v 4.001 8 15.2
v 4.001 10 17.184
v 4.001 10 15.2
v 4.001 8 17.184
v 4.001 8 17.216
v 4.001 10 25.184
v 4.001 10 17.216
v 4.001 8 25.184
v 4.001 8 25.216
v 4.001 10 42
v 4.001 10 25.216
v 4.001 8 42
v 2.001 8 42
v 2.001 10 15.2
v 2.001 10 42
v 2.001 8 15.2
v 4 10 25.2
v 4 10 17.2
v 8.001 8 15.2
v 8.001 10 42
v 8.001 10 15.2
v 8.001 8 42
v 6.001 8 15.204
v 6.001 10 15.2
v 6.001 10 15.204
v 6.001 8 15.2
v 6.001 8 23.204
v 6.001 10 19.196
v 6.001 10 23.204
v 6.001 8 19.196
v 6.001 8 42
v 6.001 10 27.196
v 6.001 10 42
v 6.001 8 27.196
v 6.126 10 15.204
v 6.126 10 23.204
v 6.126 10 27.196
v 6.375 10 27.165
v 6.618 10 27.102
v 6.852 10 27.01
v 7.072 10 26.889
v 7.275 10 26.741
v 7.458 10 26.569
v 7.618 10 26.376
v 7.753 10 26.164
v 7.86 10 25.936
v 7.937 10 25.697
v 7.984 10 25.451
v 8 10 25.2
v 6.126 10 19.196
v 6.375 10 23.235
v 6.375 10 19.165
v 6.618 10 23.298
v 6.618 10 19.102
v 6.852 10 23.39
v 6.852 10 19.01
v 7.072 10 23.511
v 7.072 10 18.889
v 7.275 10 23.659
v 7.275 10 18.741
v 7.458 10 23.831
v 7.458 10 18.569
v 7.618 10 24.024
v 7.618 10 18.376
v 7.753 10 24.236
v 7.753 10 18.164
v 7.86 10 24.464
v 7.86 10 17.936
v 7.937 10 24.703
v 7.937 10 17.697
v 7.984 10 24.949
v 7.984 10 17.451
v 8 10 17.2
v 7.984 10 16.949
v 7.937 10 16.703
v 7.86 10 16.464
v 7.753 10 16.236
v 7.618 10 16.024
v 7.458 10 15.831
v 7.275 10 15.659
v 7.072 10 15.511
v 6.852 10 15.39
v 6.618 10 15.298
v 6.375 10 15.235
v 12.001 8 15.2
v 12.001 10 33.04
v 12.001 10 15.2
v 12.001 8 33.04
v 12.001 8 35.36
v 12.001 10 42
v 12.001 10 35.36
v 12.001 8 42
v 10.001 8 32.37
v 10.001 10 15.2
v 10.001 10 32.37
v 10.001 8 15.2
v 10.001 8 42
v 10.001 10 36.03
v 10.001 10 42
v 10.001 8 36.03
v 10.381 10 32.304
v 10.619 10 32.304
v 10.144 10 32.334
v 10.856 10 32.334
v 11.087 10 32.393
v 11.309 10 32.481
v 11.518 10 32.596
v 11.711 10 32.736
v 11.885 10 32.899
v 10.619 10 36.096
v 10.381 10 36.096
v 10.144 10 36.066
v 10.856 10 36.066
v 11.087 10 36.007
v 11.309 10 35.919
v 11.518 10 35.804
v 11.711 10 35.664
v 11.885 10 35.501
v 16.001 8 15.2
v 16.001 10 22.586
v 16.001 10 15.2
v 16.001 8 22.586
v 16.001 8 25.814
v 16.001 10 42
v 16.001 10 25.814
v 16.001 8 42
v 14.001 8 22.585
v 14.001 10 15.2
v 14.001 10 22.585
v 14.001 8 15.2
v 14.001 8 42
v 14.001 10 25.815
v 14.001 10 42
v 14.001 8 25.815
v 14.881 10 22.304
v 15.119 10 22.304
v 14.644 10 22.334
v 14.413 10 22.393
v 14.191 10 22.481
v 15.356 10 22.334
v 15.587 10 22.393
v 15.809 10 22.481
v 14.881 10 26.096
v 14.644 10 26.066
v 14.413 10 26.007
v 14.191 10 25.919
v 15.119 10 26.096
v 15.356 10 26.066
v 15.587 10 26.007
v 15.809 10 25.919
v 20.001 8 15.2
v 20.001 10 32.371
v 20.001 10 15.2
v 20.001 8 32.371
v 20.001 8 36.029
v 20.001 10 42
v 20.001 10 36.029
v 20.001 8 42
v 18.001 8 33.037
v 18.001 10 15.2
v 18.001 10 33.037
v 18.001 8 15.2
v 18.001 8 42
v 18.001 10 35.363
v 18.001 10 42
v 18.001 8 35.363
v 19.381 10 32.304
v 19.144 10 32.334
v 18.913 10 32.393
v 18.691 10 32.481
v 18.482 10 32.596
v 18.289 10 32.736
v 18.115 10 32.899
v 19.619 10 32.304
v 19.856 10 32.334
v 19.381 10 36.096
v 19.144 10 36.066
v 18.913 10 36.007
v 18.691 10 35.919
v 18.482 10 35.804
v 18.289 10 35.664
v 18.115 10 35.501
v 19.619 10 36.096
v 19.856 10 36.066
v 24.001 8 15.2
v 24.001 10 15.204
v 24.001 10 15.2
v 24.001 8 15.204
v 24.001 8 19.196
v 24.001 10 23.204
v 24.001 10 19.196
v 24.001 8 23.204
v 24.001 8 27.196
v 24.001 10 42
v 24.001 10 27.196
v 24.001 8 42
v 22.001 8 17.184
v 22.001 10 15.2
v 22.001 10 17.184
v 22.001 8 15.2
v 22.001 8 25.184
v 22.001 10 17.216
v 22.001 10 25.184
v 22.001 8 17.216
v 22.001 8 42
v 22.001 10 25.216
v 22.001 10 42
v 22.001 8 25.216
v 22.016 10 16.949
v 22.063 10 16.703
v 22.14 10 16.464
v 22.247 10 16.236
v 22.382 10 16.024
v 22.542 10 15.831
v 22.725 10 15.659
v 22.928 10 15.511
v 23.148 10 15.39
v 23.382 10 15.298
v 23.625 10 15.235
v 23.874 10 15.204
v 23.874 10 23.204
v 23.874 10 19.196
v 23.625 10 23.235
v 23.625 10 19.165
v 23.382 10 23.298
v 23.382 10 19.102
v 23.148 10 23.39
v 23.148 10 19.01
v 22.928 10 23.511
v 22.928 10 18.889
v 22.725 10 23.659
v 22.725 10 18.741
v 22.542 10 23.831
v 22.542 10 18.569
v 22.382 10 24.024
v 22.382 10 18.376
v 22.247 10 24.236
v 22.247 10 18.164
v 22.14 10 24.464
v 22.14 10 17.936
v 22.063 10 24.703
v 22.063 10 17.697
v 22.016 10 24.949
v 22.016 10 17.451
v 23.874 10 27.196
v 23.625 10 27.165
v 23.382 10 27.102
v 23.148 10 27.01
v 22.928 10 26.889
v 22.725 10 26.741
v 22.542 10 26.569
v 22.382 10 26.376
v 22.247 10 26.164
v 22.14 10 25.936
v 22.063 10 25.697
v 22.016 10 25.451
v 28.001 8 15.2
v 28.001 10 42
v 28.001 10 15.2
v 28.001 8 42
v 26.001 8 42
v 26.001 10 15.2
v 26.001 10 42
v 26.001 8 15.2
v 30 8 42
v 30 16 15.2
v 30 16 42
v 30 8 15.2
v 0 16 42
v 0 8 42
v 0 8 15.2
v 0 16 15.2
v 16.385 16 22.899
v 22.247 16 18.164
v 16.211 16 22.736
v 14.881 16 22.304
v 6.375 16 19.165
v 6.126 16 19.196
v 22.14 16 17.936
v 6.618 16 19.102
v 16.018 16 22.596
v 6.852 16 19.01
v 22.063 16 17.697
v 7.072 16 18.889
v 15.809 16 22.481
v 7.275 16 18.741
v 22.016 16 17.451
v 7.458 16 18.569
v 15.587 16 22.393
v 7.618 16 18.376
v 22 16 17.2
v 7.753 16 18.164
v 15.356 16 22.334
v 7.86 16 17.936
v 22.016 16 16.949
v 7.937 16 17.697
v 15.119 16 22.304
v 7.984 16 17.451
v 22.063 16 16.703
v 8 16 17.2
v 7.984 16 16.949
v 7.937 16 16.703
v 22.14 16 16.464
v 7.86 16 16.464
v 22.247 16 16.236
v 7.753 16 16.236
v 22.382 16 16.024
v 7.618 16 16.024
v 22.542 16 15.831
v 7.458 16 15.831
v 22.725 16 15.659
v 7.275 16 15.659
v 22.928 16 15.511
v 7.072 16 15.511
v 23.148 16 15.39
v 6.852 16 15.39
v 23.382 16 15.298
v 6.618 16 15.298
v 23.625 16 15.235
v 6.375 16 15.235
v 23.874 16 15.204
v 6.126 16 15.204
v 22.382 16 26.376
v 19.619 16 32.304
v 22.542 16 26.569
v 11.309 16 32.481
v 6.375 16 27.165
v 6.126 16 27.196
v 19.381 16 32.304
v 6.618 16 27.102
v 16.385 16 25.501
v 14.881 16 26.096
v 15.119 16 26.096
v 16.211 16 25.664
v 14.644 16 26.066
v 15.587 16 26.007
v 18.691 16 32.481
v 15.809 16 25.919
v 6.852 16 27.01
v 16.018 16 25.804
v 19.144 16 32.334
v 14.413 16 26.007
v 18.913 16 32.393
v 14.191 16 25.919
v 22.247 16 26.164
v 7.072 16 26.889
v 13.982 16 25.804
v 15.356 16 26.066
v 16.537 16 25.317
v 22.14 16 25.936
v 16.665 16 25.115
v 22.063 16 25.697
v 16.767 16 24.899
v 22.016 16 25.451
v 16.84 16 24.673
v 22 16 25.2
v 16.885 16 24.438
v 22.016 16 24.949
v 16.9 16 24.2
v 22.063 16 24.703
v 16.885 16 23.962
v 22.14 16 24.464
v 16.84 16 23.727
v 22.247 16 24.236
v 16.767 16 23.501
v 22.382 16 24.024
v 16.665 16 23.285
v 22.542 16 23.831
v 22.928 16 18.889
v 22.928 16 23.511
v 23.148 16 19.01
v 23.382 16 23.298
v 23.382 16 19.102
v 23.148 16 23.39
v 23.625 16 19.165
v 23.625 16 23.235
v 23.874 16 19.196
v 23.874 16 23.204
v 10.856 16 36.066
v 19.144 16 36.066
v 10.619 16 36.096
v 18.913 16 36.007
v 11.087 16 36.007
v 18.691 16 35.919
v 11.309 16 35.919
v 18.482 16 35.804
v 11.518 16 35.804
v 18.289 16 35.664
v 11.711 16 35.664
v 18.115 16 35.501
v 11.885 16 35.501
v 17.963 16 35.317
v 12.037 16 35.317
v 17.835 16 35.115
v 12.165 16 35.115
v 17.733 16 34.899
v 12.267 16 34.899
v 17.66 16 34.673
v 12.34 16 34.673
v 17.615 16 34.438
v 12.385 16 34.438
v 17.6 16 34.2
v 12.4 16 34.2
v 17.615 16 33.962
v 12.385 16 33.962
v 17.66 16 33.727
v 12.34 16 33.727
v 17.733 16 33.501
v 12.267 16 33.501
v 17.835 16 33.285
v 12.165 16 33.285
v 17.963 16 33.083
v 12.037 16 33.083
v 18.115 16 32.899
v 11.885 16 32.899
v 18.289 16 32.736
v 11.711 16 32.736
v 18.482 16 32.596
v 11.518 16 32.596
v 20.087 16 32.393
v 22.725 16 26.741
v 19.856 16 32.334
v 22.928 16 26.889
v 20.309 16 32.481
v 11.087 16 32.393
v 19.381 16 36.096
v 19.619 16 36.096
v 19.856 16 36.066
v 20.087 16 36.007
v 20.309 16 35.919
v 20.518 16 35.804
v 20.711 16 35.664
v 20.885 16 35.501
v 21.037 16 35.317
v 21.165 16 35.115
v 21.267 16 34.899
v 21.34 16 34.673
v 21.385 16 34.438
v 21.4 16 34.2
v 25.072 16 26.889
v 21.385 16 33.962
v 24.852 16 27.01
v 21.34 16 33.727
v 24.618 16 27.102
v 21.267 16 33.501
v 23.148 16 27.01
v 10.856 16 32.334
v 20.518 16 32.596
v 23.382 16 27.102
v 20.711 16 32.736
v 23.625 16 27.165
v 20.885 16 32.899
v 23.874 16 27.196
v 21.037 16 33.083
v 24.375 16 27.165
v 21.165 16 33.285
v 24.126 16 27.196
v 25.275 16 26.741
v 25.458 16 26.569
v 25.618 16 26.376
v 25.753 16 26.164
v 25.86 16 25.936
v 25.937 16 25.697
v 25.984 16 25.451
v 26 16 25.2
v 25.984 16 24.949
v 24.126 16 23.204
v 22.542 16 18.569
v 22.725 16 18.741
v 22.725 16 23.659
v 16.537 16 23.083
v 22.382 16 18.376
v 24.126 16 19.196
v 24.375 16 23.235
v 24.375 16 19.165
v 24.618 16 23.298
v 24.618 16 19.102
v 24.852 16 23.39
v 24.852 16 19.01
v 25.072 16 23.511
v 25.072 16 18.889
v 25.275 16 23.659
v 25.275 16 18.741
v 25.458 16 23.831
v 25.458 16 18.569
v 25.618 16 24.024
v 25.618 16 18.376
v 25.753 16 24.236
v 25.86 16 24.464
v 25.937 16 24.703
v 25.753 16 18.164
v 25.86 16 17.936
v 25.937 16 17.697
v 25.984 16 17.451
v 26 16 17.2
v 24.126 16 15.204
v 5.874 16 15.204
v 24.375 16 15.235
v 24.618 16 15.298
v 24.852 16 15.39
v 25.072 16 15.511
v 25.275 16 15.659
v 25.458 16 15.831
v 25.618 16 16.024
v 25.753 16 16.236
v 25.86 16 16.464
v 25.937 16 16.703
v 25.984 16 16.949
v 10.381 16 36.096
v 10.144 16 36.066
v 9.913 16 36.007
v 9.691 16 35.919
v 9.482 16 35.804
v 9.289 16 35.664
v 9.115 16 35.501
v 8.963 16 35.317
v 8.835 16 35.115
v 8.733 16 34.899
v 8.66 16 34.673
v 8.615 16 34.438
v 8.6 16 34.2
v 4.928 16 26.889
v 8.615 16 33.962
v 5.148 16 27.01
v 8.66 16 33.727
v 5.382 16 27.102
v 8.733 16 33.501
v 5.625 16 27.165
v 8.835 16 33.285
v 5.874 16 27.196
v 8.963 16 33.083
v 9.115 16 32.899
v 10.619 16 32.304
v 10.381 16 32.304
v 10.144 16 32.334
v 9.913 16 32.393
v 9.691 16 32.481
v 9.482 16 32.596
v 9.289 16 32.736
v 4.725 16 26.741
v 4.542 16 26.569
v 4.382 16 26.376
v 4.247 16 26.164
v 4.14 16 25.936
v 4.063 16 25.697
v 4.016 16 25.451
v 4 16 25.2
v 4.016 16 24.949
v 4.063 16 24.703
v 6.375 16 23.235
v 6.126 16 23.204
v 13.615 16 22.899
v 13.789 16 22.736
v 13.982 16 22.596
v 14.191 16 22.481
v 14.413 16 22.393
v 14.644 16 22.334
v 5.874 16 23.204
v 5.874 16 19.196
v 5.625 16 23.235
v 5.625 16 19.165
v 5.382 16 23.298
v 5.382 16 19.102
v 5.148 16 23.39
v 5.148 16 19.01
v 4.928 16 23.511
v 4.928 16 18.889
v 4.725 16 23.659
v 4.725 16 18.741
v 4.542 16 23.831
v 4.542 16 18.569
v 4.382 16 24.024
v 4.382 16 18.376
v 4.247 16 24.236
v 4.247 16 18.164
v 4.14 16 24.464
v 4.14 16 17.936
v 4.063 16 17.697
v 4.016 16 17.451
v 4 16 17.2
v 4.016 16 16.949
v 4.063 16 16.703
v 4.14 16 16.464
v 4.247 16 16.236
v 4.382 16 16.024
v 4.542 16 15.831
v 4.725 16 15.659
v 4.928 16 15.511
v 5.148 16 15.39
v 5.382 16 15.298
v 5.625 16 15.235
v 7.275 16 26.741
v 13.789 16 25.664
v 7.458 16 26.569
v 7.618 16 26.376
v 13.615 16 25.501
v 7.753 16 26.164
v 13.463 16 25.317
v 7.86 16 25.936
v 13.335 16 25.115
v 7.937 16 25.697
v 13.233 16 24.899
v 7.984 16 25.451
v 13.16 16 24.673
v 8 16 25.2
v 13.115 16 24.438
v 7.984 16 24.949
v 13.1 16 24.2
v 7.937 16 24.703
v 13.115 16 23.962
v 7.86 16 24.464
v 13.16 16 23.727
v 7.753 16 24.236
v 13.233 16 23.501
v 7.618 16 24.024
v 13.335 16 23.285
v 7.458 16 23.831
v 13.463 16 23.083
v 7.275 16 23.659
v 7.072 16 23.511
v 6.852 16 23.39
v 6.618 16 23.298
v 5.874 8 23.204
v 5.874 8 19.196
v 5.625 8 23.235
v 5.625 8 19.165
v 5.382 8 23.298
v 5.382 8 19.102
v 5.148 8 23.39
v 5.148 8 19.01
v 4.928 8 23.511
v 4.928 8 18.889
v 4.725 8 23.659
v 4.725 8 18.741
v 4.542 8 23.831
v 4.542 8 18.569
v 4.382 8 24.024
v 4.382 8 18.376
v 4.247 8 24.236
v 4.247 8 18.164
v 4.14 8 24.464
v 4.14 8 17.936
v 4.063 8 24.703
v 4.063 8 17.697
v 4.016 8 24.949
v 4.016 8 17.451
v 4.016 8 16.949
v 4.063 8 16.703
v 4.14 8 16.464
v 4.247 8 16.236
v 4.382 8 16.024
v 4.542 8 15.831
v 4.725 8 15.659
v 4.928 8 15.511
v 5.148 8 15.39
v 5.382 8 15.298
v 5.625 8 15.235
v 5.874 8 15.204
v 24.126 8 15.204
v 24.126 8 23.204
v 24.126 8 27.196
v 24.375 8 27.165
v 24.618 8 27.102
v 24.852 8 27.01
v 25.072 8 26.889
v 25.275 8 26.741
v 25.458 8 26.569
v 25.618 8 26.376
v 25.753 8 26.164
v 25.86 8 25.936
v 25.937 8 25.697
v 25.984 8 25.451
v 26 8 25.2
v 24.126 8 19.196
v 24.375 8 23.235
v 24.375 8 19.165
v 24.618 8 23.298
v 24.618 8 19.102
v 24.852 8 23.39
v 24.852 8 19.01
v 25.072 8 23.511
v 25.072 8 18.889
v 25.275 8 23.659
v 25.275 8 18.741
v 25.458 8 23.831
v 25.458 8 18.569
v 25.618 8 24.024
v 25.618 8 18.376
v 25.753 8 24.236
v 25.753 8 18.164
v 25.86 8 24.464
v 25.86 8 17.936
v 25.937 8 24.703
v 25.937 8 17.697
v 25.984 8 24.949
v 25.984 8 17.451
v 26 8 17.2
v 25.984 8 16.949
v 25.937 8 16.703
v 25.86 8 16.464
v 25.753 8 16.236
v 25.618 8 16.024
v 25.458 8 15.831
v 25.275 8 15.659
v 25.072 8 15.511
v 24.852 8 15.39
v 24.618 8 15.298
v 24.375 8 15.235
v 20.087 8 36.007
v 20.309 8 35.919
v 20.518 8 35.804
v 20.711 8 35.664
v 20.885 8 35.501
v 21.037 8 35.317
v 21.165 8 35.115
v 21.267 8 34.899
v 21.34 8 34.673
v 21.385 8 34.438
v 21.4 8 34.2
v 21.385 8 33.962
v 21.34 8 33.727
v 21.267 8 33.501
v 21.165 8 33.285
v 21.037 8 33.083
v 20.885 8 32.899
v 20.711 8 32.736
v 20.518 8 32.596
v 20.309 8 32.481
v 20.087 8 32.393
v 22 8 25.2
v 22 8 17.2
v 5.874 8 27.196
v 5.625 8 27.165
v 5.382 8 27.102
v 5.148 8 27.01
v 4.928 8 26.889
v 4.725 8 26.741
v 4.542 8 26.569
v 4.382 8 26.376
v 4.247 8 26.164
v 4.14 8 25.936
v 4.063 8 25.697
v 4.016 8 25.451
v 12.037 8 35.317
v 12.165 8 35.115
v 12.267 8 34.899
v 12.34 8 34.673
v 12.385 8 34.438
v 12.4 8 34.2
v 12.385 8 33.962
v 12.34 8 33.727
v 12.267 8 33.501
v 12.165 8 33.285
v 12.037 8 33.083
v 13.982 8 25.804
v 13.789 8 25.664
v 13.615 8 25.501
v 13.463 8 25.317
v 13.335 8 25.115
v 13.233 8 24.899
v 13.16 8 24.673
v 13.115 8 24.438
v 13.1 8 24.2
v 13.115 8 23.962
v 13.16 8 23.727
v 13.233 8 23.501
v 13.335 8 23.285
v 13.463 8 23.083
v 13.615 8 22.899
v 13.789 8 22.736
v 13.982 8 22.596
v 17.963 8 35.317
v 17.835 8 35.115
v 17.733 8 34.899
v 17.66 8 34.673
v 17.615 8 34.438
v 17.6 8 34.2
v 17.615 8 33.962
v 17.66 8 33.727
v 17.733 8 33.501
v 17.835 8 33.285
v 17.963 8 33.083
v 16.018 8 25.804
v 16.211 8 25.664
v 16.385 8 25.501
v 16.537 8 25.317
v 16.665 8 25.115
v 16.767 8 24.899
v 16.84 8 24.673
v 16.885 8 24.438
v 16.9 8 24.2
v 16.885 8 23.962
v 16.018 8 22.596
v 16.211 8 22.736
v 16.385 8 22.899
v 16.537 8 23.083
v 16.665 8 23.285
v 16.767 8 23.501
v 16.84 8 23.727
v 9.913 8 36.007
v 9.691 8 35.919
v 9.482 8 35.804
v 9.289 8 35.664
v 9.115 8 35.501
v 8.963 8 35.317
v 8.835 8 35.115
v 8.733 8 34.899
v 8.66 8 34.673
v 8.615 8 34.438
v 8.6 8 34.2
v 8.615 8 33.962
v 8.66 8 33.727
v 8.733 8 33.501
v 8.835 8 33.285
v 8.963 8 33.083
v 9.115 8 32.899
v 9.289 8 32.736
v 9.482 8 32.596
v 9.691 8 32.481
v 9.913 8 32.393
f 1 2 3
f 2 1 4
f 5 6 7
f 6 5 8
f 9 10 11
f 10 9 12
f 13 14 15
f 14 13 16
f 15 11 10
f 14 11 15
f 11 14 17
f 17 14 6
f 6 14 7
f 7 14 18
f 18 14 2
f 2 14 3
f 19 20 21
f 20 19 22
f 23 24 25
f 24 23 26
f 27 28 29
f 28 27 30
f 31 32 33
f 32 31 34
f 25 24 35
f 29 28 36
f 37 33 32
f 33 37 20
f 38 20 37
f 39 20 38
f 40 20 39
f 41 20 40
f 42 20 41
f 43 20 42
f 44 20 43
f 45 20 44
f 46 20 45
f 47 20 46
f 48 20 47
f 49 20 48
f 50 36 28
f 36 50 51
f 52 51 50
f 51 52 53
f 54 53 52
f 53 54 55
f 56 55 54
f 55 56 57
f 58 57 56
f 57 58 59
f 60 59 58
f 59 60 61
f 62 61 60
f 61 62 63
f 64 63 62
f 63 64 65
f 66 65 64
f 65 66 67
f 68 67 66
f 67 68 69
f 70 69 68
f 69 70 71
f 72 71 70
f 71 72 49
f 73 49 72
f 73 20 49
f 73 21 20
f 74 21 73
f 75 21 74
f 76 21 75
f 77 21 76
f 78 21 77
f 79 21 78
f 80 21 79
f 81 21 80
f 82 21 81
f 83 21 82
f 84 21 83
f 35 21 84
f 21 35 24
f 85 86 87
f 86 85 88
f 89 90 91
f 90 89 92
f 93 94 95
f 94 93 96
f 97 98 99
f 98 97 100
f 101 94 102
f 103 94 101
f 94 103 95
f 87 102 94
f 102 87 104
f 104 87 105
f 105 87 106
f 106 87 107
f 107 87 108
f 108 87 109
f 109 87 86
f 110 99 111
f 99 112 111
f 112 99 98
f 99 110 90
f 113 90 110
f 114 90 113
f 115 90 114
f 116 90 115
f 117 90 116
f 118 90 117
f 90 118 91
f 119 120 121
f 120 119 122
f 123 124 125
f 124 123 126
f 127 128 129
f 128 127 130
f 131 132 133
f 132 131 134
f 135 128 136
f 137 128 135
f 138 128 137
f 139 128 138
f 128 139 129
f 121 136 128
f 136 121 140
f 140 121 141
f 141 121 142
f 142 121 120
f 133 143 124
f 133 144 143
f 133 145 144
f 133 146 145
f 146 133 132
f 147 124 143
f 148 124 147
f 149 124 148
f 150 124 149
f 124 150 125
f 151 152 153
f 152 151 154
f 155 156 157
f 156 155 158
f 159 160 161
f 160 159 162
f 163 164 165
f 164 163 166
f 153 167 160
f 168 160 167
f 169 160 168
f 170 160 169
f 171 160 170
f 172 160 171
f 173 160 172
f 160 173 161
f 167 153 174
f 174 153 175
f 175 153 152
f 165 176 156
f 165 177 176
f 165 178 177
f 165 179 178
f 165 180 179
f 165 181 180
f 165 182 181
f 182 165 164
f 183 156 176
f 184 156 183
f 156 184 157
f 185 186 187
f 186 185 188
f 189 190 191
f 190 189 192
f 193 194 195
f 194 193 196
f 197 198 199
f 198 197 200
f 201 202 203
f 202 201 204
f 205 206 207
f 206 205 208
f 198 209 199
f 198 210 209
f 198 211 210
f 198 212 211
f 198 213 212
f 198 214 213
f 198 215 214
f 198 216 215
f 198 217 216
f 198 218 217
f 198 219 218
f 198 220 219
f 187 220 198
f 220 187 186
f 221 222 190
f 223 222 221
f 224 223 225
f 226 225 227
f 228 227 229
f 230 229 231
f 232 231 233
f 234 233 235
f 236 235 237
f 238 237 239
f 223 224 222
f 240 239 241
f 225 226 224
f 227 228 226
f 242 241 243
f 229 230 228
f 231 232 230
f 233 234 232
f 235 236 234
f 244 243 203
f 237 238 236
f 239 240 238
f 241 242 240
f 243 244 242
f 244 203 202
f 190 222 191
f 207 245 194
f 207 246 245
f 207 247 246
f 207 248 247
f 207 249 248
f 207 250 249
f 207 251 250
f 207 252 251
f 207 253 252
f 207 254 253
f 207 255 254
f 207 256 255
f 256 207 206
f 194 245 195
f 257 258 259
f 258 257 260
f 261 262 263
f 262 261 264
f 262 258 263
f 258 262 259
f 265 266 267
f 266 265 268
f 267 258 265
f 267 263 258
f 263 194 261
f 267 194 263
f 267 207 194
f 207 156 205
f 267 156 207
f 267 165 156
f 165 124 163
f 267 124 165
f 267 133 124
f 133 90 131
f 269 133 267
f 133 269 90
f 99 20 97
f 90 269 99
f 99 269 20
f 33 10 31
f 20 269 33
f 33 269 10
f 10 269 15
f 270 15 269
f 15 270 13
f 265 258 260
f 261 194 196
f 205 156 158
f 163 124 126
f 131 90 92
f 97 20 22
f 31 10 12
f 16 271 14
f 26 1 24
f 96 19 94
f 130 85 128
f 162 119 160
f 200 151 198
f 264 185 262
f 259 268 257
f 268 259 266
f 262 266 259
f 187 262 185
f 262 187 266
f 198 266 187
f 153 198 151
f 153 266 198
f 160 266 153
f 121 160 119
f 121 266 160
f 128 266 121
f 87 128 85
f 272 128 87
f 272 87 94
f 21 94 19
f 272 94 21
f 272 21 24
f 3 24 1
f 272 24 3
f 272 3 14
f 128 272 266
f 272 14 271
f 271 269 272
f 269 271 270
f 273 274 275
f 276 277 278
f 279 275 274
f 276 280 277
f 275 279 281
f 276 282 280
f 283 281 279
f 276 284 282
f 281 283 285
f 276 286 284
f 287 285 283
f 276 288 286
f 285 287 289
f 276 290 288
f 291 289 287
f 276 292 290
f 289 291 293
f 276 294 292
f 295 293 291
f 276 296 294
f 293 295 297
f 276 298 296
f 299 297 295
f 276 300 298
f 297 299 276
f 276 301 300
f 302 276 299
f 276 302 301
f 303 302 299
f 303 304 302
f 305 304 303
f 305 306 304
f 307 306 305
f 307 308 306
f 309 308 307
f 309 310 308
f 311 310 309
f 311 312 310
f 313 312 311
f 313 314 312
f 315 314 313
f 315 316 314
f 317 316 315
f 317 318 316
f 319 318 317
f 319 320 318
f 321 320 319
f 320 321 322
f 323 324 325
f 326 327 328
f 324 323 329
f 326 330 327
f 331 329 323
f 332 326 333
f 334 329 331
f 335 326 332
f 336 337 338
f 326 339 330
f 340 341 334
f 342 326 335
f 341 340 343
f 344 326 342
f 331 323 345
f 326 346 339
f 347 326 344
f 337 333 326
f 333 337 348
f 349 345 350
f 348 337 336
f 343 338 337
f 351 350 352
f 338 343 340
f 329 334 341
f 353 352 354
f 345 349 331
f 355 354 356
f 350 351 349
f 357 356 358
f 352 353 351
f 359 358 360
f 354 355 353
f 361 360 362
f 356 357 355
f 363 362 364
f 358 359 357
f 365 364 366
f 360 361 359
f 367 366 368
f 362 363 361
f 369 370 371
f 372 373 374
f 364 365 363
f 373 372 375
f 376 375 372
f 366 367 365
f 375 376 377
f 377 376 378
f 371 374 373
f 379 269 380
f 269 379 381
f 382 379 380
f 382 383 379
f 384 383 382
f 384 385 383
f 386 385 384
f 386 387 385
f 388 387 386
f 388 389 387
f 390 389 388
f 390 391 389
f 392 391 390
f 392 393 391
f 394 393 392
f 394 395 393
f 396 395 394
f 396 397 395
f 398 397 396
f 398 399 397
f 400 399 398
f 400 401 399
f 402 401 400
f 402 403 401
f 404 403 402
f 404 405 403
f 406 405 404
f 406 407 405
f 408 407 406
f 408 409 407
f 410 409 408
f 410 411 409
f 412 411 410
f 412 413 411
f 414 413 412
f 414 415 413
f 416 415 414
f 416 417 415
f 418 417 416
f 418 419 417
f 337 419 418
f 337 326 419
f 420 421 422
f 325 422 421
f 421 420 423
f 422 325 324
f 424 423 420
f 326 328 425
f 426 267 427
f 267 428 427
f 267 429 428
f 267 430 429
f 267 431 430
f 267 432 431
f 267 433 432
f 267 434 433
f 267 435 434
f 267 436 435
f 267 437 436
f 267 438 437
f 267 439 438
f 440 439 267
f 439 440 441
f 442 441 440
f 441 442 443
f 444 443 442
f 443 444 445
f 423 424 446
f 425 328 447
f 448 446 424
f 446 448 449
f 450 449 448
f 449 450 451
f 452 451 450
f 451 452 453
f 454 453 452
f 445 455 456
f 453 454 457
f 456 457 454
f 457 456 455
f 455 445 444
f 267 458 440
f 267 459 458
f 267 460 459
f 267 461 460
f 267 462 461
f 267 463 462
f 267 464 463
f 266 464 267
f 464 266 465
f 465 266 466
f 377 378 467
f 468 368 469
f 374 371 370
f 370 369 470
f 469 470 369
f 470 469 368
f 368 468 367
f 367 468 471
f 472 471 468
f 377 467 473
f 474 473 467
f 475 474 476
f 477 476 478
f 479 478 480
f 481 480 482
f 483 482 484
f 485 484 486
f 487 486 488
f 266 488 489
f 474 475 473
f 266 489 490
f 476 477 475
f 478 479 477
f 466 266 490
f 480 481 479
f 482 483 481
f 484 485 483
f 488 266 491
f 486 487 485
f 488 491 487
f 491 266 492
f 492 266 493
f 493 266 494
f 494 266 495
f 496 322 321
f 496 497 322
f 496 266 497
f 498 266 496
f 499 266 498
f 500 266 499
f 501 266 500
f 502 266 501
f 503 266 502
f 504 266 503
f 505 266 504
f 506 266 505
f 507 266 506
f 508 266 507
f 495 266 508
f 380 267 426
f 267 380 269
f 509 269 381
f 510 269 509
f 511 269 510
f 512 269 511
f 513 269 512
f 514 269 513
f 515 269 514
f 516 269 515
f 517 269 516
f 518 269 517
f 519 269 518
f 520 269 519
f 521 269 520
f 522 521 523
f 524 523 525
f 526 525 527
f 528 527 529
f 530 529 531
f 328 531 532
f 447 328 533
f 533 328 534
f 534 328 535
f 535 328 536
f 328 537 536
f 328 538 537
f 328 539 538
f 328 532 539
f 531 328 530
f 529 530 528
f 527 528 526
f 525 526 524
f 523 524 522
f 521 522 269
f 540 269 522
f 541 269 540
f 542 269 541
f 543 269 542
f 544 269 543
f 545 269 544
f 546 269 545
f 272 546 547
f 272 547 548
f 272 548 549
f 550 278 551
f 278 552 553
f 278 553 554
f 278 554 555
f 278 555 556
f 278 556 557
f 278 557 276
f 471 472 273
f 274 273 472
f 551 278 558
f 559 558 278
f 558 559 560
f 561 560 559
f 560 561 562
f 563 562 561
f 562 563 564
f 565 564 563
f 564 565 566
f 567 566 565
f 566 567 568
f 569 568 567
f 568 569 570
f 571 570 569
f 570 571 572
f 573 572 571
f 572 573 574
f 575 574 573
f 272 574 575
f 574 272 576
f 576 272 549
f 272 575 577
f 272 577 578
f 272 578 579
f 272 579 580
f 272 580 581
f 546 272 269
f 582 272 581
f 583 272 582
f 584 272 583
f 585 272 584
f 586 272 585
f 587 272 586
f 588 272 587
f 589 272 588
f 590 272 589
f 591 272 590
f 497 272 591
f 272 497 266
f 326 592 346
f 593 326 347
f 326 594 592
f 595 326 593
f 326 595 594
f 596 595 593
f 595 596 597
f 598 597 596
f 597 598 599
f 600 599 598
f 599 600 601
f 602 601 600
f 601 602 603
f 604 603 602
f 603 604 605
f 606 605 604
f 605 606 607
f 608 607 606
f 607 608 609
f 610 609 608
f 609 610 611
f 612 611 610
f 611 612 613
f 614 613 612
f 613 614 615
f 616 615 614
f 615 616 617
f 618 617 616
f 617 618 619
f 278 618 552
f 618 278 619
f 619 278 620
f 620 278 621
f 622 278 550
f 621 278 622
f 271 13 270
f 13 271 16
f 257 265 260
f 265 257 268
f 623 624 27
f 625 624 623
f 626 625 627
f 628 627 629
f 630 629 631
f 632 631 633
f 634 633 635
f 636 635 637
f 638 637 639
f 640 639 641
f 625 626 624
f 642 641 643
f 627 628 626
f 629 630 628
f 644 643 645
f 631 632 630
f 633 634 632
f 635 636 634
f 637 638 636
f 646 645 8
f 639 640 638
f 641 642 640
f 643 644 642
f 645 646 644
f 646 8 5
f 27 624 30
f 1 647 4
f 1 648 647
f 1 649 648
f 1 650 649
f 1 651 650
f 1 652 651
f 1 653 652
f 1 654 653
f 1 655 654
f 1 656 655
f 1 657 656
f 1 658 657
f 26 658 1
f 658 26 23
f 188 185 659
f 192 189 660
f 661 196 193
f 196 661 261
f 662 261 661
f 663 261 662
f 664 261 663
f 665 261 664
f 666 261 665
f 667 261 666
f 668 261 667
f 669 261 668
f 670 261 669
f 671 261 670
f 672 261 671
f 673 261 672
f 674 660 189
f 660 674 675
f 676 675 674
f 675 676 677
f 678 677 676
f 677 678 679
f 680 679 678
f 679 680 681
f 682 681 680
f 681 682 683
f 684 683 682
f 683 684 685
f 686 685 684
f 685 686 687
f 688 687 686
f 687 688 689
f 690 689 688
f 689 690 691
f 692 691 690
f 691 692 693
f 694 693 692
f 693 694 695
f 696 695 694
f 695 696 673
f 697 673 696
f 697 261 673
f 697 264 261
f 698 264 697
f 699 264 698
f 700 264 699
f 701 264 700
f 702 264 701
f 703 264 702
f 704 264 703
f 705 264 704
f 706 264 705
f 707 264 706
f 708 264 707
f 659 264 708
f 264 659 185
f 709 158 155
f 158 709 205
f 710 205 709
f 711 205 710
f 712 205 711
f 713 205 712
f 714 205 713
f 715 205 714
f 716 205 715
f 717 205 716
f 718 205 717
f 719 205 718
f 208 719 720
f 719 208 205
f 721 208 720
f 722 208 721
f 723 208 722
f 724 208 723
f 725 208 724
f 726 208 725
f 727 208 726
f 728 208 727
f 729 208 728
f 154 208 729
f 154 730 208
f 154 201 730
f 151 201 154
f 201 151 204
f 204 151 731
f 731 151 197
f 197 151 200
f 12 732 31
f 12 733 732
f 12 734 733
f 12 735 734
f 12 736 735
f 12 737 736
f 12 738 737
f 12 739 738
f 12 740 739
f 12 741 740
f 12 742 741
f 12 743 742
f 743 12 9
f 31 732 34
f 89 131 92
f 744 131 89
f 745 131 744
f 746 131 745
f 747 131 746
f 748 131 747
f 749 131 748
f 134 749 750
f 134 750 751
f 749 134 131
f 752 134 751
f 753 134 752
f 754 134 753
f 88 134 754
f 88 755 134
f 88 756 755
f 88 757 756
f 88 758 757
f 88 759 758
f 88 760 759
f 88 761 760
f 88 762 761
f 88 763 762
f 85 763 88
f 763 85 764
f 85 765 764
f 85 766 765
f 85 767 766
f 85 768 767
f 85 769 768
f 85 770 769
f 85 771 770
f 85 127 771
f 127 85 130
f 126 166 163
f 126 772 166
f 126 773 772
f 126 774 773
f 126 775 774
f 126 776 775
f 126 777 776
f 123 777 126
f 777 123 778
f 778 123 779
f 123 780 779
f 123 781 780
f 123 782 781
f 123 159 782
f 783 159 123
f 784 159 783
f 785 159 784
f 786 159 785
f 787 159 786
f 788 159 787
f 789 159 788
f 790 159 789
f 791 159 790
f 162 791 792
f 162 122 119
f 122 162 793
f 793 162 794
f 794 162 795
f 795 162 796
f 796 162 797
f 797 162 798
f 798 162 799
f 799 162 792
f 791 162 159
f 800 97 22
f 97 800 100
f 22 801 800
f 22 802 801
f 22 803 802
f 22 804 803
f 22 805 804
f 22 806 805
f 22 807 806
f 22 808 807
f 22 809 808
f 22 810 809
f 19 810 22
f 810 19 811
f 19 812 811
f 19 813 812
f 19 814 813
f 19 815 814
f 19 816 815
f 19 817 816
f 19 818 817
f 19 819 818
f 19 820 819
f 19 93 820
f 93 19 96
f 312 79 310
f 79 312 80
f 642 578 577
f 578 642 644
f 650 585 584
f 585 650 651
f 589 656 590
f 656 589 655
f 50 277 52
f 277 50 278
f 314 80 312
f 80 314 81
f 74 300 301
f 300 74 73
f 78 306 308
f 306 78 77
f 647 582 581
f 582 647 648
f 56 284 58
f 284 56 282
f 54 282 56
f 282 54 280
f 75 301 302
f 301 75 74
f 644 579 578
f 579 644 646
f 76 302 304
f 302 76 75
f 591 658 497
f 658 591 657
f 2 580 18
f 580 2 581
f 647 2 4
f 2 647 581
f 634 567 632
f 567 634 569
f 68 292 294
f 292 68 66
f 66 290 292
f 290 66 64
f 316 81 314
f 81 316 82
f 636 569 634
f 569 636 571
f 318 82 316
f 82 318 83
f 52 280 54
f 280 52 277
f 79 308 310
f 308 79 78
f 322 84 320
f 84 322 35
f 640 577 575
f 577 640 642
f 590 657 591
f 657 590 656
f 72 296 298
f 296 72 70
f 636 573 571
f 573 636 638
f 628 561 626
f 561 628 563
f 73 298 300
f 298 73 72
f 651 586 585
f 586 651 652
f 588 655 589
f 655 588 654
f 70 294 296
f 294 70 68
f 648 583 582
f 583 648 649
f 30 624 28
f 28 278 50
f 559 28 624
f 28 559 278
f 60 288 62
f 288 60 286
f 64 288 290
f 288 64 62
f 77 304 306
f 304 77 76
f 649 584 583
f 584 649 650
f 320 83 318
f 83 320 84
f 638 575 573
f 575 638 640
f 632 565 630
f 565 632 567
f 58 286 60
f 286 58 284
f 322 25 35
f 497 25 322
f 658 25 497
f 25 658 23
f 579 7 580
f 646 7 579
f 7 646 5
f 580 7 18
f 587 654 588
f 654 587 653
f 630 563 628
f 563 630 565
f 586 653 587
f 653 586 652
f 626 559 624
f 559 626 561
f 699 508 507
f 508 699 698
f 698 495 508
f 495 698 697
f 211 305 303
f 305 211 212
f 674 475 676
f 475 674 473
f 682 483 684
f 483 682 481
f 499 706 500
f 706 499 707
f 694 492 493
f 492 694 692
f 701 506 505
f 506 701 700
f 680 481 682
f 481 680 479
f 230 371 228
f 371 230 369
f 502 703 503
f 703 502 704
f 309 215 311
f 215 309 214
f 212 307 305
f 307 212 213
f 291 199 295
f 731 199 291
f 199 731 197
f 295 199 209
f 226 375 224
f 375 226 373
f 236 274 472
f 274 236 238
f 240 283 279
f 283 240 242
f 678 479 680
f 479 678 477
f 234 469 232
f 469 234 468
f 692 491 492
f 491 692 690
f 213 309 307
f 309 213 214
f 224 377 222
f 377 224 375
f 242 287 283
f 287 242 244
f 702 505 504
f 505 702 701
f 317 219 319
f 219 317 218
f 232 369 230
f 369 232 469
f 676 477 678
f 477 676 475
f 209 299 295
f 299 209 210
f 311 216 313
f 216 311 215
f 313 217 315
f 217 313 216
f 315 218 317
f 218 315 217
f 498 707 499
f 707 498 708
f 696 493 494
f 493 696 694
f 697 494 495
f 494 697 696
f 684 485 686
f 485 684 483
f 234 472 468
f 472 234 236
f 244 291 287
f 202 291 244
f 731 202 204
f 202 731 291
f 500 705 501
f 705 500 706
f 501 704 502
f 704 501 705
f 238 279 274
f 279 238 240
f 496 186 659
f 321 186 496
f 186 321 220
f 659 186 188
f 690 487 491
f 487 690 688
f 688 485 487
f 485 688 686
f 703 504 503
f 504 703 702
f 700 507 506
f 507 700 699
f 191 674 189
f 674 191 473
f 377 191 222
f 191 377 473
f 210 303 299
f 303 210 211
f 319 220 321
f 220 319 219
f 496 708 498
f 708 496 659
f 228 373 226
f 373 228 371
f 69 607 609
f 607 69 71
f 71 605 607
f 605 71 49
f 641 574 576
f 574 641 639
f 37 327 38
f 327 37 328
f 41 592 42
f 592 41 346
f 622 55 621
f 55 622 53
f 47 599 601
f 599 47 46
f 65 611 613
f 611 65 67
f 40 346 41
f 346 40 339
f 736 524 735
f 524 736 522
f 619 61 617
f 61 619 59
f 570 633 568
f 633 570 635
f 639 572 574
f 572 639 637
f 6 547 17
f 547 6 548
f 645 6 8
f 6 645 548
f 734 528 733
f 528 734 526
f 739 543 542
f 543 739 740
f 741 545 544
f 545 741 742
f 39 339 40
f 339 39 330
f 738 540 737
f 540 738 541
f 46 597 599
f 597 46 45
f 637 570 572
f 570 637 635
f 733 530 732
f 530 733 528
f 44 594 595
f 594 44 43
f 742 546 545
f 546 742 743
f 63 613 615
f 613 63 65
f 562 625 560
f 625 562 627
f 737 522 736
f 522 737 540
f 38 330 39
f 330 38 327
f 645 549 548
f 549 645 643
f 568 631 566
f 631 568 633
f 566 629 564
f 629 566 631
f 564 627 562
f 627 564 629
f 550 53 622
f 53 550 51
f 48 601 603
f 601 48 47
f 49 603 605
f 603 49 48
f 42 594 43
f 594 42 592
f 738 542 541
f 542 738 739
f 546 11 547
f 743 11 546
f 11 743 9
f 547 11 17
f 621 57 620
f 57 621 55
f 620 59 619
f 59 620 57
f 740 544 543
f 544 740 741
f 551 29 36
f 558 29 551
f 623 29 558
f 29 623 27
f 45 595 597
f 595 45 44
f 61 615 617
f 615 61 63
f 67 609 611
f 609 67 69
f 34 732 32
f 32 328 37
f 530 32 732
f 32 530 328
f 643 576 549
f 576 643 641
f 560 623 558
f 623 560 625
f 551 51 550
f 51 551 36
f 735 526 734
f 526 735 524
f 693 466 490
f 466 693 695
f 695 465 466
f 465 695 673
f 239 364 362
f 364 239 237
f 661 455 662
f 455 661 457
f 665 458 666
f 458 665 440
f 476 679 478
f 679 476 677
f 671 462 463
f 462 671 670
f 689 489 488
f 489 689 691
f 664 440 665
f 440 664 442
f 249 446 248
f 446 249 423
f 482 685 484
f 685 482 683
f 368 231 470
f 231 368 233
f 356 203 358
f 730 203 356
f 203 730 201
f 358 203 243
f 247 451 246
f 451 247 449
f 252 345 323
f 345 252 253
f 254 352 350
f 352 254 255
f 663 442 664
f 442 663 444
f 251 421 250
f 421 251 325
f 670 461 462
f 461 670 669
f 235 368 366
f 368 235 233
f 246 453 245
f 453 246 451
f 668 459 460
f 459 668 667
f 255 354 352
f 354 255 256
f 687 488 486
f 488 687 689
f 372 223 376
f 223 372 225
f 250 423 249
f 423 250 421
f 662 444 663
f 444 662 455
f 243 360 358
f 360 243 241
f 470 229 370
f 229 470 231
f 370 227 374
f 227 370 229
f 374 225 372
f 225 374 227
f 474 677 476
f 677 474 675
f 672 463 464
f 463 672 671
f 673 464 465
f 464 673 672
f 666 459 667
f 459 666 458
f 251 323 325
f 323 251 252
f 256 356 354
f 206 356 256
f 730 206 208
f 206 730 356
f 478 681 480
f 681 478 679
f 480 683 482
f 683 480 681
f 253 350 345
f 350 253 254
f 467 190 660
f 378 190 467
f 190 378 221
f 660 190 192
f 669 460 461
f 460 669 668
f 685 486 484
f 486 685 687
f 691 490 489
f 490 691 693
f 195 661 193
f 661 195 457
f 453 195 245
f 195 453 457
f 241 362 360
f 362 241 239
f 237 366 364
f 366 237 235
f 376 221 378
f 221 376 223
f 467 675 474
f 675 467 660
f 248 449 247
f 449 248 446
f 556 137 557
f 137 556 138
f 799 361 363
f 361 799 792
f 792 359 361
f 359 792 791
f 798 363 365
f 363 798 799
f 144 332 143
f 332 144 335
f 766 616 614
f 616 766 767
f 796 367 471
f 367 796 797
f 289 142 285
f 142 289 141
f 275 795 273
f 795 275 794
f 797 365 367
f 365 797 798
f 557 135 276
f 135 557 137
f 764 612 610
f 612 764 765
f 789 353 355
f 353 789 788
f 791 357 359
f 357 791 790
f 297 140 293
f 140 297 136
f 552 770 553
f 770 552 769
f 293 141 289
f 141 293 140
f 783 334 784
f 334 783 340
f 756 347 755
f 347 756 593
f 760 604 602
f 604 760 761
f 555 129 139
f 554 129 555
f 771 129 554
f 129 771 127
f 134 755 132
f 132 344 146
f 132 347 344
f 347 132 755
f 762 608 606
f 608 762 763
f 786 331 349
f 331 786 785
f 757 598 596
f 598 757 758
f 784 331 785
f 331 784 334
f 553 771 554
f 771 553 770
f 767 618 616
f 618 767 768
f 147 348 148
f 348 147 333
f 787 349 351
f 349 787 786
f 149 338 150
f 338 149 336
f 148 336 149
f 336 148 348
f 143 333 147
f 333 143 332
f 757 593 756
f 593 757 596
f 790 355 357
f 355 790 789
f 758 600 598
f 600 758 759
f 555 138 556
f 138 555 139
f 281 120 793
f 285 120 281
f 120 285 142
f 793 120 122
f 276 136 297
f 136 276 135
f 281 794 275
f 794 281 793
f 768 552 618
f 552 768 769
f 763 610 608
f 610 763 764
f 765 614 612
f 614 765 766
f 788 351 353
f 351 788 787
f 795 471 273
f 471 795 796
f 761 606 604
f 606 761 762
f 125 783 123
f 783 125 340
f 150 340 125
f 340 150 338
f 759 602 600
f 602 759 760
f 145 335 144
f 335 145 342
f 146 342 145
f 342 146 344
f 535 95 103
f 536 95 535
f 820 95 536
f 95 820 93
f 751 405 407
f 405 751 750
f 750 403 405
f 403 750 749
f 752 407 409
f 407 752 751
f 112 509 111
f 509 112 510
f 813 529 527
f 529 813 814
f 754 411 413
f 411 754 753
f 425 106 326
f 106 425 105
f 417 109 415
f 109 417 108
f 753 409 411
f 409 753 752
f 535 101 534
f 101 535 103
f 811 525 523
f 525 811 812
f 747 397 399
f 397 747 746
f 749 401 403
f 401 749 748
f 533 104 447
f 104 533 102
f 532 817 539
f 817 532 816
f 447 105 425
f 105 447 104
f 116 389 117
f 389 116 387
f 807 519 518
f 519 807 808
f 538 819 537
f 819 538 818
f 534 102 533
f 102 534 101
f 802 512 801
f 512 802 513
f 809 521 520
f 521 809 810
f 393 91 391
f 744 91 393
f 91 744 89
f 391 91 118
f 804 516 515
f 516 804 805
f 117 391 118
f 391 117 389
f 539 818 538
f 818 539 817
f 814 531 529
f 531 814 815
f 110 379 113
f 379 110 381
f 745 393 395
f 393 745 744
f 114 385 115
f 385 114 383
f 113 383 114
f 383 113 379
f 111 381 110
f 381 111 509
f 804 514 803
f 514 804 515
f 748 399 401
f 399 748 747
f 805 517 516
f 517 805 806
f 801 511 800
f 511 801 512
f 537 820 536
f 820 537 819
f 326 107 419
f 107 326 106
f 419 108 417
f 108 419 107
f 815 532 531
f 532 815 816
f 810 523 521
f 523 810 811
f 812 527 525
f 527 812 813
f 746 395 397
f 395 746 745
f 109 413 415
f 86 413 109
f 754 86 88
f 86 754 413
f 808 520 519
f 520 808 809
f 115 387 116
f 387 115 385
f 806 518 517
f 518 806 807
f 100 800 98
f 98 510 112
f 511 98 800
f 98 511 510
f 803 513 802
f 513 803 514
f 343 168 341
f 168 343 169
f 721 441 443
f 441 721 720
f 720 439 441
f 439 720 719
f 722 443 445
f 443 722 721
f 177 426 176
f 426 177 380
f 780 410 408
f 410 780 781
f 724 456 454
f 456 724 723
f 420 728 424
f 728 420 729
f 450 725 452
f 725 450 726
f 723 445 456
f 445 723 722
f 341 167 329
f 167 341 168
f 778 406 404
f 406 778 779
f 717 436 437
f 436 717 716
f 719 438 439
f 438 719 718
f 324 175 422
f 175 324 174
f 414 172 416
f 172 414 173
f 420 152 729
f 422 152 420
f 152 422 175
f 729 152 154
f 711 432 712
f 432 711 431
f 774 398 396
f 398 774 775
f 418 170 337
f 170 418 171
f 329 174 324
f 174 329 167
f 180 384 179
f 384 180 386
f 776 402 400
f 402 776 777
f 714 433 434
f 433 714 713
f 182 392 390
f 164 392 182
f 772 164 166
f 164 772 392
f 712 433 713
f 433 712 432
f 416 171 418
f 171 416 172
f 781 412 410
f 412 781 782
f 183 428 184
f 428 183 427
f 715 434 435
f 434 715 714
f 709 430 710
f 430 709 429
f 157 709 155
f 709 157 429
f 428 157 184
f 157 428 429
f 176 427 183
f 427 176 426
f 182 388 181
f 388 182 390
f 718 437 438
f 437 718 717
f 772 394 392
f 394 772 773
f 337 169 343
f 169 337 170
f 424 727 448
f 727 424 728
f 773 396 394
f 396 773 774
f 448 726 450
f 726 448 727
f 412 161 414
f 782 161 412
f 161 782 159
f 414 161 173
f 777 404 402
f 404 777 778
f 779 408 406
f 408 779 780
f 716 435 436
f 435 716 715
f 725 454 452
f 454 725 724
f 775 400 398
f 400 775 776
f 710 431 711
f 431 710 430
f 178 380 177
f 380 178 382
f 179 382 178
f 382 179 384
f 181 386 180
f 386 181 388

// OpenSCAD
part="mount"; //mount or carridge

// LM8UU dimentions
LM8UU_length = 25;
LM8UU_diameter = 15;

// X Axis dimensions
x_rod_spacing = 45;
x_rod_radius = 4;

//Belt
belt_thickness_no_tooth = 0.75;
belt_thickness_tooth = 1.45;
belt_double = belt_thickness_no_tooth+belt_thickness_tooth+0.5;

//Carriage
carriage_width = 30;
carriage_padding = 0.1;
carriage_height = x_rod_spacing+LM8UU_diameter+carriage_padding*2;
carriage_depth = 12;

//cyclops
heatbreak_x1=6;
heatbreak_x2=24;
heatbreak_z1=3;
heatbreak_z2=11;
heatbreak_diameter=4;
heatsink_baseline=carriage_padding*2+LM8UU_diameter-1;
mount_x1=15;
mount_z1=10;
mount_x2=10.5;
mount_z2=20;
mount_x3=19.5;
mount_z3=20;
mount_diameter=3.8;

module tie(){
    difference(){
        rotate([0,90,0]) cylinder(d=LM8UU_diameter+10, h=4, $fn=50);
        rotate([0,90,0]) cylinder(d=LM8UU_diameter+3, h=4, $fn=50);
    }
}

module heatbreak_hole(){
    rotate([-90,0,0]) cylinder(d=heatbreak_diameter, h=carriage_depth*2+10, $fn=50);
    //translate([0,-4,0]) rotate([-90,0,0]) cylinder(d=heatbreak_diameter+3, h=carriage_depth+2, $fn=100);
}

module mount_hole(){
    rotate([-90,0,0]) cylinder(d=mount_diameter, h=carriage_depth*2+10, $fn=50);
    if (part=="carridge") translate([0,-4,0]) rotate([-90,0,0]) cylinder(d=mount_diameter+3, h=carriage_depth+2, $fn=50);
}

module lug_hole(){
    rotate([-90,0,0]) cylinder(d=4, h=carriage_depth+2, $fn=50);
    //translate([0,0,-2]) rotate([-90,0,0]) cylinder(d=5, h=carriage_depth+2, $fn=100);
}


difference(){
    if (part=="carridge") {
        //back plane
        cube(size=[carriage_width,carriage_depth,carriage_height+1]);
    }
    else if (part=="mount") {
        local_height = x_rod_spacing-LM8UU_diameter-carriage_padding*2-3;
        translate([0,8,LM8UU_diameter+carriage_padding*2]) 
            cube(size=[carriage_width,8,local_height]);
    }
    
    if (part=="carridge"){
    //LM8UU
    translate([2.5,0,carriage_padding+LM8UU_diameter/2]) rotate([0,90,0]) cylinder(d=LM8UU_diameter, h=LM8UU_length, $fn=50);
    translate([2.5,0,carriage_height-carriage_padding-LM8UU_diameter/2]) rotate([0,90,0]) cylinder(d=LM8UU_diameter, h=LM8UU_length, $fn=50);
    
    //ties
    translate([8,0,carriage_padding+LM8UU_diameter/2]) tie();
    translate([carriage_width-12,0,carriage_padding+LM8UU_diameter/2]) tie();
    translate([6,0,carriage_height-carriage_padding-LM8UU_diameter/2]) tie();
    translate([carriage_width-10,0,carriage_height-carriage_padding-LM8UU_diameter/2]) tie();
    
    translate([8,-1,-1]) cube(size=[4,LM8UU_diameter/2,3]);
    translate([carriage_width-12,-1,-1]) cube(size=[4,LM8UU_diameter/2,3]);
    
    //translate([8,LM8UU_diameter/2-.01,LM8UU_diameter/8]) cube(size=[3,carriage_depth,LM8UU_diameter/3*2+1]);
   // translate([carriage_width-11,LM8UU_diameter/2-.01,LM8UU_diameter/8]) cube(size=[3,carriage_depth,LM8UU_diameter/3*2+1]);
    
    //rods
    translate([-1,0,carriage_padding+x_rod_radius+3.5]) rotate([0,90,0]) cylinder(r=x_rod_radius+2, h=carriage_width+2, $fn=50);
    translate([-1,0,carriage_height-x_rod_radius-3.5-carriage_padding]) rotate([0,90,0]) cylinder(r=x_rod_radius+2, h=carriage_width+2, $fn=50);
    
    //belt
    translate([-1,-1,LM8UU_diameter+carriage_padding*2+1]) difference(){
        local_height = x_rod_spacing-LM8UU_diameter-carriage_padding*2-5;
        cube(size=[carriage_width+2,8,local_height]);
        
        //posts
        translate([3,-1,12.5]) lug_hole();
        translate([29,-1,12.5]) lug_hole();
        //channels
        translate([0,0,carriage_padding*2]){
            difference() {
                union() {
                    translate([1,-1,local_height-belt_double-5]) cube(size=[4,10,5]);
                    translate([27,-1,local_height-belt_double-5]) cube(size=[4,10,5]);
                
                    translate([5,0,local_height-belt_double-2.5]) rotate([-90,0,0]) cylinder(d=5,h=100,$fn=50);
                    translate([27,0,local_height-belt_double-2.5]) rotate([-90,0,0]) cylinder(d=5,h=100,$fn=50);
                }
                translate([5,0,local_height-belt_double-2.5]) rotate([-90,0,0]) cylinder(d=3.5,h=100,$fn=50);
                translate([27,0,local_height-belt_double-2.5]) rotate([-90,0,0]) cylinder(d=3.5,h=100,$fn=50);
            }
        }
    }
    }
   
    //Cyclops heatbreak 
    translate([heatbreak_x1,-1,heatbreak_z1+heatsink_baseline]) heatbreak_hole();
    translate([heatbreak_x2,-1,heatbreak_z1+heatsink_baseline]) heatbreak_hole();
    translate([heatbreak_x1,-1,heatbreak_z2+heatsink_baseline]) heatbreak_hole();
    translate([heatbreak_x2,-1,heatbreak_z2+heatsink_baseline]) heatbreak_hole();
    
    //Cyclops mount
    translate([mount_x1,-1,mount_z1+heatsink_baseline]) mount_hole();
    translate([mount_x2,-1,mount_z2+heatsink_baseline]) mount_hole();
    translate([mount_x3,-1,mount_z3+heatsink_baseline]) mount_hole();
     
    //cooling
    if (part=="mount") translate([0.001,7,LM8UU_diameter+carriage_padding*2-1]){
        local_height = x_rod_spacing-LM8UU_diameter-carriage_padding*2+2;
        translate([2,0,0]) cube(size=[2,3,local_height]);
        translate([6,0,0]) cube(size=[2,3,local_height]);
        translate([10,0,0]) cube(size=[2,3,local_height]);
        translate([14,0,0]) cube(size=[2,3,local_height]);
        translate([18,0,0]) cube(size=[2,3,local_height]);
        translate([22,0,0]) cube(size=[2,3,local_height]);
        translate([26,0,0]) cube(size=[2,3,local_height]);
    }
    
    
    //translate([-1,LM8UU_diameter/2+1,-1]) cube(size=[carriage_width+2,carriage_depth-LM8UU_diameter/2+1,LM8UU_diameter]);
}
